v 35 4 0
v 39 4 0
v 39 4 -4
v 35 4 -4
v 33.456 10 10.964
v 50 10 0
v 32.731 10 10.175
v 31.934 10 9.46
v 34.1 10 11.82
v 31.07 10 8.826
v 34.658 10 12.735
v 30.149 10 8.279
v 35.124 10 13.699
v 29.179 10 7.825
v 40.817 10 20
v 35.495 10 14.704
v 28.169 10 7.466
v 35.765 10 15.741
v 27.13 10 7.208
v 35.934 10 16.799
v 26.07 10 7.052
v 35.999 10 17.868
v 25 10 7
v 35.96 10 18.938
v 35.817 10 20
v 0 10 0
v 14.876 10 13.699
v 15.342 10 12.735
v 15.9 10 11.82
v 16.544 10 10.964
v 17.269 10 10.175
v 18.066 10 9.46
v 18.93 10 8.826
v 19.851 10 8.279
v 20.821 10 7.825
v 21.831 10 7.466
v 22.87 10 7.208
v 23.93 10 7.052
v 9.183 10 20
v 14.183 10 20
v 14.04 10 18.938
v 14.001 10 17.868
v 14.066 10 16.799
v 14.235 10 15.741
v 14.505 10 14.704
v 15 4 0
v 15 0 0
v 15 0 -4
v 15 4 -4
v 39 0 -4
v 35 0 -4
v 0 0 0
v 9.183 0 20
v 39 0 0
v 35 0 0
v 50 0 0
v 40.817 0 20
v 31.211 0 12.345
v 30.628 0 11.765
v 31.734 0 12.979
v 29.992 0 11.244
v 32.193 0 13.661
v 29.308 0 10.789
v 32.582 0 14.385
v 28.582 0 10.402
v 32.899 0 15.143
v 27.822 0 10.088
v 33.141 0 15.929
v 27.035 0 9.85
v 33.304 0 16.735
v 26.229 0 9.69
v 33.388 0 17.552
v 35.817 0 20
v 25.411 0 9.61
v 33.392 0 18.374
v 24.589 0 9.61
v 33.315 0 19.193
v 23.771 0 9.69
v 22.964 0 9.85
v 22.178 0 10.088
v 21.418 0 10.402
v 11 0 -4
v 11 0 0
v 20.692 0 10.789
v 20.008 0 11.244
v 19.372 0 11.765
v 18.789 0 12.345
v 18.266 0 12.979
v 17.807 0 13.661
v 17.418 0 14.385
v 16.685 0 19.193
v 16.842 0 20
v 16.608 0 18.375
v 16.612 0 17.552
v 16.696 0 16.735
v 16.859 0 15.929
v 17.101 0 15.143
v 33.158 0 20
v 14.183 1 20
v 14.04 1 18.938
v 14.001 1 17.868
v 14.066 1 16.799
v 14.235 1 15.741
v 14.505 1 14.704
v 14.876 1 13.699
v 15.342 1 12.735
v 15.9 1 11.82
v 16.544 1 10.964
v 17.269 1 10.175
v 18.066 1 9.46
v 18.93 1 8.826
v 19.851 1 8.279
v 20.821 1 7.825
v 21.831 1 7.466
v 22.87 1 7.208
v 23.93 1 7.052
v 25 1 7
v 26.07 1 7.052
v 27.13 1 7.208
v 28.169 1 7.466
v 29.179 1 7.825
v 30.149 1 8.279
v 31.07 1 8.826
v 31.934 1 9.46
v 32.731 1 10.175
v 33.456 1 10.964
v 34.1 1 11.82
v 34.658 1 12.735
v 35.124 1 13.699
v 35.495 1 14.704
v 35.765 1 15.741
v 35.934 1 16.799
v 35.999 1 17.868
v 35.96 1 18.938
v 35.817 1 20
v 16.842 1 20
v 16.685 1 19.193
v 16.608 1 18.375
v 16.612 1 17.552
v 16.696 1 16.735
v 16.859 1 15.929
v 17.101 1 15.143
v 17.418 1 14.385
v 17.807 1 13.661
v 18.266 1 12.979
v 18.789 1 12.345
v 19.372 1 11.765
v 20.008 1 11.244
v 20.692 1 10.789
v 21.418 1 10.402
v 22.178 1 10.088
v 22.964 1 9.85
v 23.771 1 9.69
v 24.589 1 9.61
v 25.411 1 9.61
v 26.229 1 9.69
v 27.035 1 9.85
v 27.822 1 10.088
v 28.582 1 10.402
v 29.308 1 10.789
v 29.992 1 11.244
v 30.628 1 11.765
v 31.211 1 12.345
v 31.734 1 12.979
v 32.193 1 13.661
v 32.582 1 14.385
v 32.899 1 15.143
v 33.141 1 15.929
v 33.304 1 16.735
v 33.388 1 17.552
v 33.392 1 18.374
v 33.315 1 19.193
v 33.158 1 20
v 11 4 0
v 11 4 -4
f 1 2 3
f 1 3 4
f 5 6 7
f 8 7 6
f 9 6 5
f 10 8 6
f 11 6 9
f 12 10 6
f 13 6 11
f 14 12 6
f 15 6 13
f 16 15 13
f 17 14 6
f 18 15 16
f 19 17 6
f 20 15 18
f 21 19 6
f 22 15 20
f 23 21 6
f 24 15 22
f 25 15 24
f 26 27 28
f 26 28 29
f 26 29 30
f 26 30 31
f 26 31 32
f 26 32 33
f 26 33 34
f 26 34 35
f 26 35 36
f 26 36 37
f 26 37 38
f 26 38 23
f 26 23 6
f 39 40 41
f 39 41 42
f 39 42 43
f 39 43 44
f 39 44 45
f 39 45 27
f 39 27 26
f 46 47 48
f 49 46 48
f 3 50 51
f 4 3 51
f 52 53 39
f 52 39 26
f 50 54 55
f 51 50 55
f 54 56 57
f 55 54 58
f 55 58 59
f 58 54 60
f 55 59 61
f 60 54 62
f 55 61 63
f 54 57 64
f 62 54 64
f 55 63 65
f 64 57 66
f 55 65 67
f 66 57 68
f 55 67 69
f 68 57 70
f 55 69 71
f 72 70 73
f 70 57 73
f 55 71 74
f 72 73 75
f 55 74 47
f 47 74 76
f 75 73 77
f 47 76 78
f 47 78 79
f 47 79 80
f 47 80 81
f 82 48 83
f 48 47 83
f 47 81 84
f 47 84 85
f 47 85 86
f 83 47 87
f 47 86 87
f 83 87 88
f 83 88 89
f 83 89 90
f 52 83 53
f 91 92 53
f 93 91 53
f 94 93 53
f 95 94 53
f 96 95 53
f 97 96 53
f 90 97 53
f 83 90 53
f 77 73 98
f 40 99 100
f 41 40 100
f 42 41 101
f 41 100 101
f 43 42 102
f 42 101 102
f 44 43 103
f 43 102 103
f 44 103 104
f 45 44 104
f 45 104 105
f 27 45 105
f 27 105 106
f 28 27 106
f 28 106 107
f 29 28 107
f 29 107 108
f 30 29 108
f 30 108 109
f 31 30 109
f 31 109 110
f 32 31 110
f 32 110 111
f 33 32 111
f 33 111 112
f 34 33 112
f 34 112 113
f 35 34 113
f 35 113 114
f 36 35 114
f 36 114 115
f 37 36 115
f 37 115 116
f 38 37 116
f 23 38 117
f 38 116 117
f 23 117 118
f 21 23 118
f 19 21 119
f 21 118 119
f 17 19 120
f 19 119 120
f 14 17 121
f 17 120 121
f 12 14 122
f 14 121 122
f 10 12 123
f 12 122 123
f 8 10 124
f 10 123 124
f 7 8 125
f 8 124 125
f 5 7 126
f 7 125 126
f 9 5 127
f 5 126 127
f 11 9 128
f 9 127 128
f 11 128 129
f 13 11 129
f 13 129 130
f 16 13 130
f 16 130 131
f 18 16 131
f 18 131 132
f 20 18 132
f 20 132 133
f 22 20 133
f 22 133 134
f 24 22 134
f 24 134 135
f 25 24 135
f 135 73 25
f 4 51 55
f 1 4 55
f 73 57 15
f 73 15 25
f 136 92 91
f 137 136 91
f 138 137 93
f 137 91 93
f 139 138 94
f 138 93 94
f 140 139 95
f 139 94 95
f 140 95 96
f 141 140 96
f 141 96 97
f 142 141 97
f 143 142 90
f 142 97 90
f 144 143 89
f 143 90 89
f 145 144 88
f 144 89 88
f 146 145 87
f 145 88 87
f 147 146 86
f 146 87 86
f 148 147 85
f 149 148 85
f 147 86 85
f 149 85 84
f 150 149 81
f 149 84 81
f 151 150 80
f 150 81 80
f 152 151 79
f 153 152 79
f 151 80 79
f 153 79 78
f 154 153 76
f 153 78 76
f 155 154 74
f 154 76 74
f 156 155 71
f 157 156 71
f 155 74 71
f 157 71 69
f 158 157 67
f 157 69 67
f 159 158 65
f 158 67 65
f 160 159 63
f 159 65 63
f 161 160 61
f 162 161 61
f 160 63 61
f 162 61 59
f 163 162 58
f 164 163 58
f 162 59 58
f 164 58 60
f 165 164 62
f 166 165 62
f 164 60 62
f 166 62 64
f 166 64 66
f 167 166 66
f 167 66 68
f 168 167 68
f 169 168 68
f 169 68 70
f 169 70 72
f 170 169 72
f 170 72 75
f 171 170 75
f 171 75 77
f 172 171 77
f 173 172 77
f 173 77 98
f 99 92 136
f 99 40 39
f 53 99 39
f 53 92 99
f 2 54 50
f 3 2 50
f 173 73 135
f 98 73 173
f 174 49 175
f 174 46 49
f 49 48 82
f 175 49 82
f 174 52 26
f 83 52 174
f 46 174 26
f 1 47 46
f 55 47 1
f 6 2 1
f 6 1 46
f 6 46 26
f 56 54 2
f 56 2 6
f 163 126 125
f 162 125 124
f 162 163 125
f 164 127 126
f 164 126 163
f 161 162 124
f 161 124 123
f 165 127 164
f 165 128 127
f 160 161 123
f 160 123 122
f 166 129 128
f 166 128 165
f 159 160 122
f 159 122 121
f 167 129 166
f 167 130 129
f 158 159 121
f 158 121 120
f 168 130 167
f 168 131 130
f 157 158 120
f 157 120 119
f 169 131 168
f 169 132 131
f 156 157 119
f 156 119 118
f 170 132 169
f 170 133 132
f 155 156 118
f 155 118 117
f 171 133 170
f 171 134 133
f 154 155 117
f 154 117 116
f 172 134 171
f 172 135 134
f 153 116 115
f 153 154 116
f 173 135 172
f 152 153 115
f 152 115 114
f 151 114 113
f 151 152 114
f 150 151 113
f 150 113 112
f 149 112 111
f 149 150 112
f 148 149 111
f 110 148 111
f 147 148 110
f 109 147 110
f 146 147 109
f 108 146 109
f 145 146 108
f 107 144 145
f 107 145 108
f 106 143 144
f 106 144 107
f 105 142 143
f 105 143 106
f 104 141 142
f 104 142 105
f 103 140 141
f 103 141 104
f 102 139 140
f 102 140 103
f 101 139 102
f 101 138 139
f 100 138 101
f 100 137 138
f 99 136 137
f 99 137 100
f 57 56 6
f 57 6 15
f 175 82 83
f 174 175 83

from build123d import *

# Parameters (mm, degrees)
PAD002_DEPTH = 10
PAD001_DEPTH = 1
PAD007_DEPTH = 4


with BuildPart() as body002_bot:
    # Sketch002 → Pad002 (new body)
    with BuildSketch(Plane.XZ):
        with BuildLine():
            ThreePointArc((14.183335, 20), (24.999984, 7), (35.816645, 19.999991))
            Line((40.816645, 19.999991), (35.816645, 19.999991))
            Line((50, 0), (40.816645, 19.999991))
            Line((0, 0), (50, 0))
            Line((9.183335, 20), (0, 0))
            Line((14.183335, 20), (9.183335, 20))
        make_face()
    extrude(amount=-PAD002_DEPTH)


with BuildPart() as body001_bot:
    # Sketch001 → Pad001 (new body)
    with BuildSketch(Plane.XZ):
        with BuildLine():
            ThreePointArc((16.841546, 20), (24.999965, 9.6), (33.158414, 19.999976))
            Line((38.158414, 19.999976), (33.158414, 19.999976))
            Line((50, 0), (38.158414, 19.999976))
            Line((0, 0), (50, 0))
            Line((11.841546, 20), (0, 0))
            Line((16.841546, 20), (11.841546, 20))
        make_face()
    extrude(amount=-PAD001_DEPTH)

    # Boolean001: union Body002_bot
    add(body002_bot.part)

    # Sketch007 → Pad007 (join)
    with BuildSketch(Plane.XZ):
        Polygon((11, -4), (11, 4.332914), (39, 4.332914), (39, -4), (35, -4), (35, 0), (15, 0), (15, -4), align=None)
    extrude(amount=-PAD007_DEPTH)


solid = body001_bot.part
